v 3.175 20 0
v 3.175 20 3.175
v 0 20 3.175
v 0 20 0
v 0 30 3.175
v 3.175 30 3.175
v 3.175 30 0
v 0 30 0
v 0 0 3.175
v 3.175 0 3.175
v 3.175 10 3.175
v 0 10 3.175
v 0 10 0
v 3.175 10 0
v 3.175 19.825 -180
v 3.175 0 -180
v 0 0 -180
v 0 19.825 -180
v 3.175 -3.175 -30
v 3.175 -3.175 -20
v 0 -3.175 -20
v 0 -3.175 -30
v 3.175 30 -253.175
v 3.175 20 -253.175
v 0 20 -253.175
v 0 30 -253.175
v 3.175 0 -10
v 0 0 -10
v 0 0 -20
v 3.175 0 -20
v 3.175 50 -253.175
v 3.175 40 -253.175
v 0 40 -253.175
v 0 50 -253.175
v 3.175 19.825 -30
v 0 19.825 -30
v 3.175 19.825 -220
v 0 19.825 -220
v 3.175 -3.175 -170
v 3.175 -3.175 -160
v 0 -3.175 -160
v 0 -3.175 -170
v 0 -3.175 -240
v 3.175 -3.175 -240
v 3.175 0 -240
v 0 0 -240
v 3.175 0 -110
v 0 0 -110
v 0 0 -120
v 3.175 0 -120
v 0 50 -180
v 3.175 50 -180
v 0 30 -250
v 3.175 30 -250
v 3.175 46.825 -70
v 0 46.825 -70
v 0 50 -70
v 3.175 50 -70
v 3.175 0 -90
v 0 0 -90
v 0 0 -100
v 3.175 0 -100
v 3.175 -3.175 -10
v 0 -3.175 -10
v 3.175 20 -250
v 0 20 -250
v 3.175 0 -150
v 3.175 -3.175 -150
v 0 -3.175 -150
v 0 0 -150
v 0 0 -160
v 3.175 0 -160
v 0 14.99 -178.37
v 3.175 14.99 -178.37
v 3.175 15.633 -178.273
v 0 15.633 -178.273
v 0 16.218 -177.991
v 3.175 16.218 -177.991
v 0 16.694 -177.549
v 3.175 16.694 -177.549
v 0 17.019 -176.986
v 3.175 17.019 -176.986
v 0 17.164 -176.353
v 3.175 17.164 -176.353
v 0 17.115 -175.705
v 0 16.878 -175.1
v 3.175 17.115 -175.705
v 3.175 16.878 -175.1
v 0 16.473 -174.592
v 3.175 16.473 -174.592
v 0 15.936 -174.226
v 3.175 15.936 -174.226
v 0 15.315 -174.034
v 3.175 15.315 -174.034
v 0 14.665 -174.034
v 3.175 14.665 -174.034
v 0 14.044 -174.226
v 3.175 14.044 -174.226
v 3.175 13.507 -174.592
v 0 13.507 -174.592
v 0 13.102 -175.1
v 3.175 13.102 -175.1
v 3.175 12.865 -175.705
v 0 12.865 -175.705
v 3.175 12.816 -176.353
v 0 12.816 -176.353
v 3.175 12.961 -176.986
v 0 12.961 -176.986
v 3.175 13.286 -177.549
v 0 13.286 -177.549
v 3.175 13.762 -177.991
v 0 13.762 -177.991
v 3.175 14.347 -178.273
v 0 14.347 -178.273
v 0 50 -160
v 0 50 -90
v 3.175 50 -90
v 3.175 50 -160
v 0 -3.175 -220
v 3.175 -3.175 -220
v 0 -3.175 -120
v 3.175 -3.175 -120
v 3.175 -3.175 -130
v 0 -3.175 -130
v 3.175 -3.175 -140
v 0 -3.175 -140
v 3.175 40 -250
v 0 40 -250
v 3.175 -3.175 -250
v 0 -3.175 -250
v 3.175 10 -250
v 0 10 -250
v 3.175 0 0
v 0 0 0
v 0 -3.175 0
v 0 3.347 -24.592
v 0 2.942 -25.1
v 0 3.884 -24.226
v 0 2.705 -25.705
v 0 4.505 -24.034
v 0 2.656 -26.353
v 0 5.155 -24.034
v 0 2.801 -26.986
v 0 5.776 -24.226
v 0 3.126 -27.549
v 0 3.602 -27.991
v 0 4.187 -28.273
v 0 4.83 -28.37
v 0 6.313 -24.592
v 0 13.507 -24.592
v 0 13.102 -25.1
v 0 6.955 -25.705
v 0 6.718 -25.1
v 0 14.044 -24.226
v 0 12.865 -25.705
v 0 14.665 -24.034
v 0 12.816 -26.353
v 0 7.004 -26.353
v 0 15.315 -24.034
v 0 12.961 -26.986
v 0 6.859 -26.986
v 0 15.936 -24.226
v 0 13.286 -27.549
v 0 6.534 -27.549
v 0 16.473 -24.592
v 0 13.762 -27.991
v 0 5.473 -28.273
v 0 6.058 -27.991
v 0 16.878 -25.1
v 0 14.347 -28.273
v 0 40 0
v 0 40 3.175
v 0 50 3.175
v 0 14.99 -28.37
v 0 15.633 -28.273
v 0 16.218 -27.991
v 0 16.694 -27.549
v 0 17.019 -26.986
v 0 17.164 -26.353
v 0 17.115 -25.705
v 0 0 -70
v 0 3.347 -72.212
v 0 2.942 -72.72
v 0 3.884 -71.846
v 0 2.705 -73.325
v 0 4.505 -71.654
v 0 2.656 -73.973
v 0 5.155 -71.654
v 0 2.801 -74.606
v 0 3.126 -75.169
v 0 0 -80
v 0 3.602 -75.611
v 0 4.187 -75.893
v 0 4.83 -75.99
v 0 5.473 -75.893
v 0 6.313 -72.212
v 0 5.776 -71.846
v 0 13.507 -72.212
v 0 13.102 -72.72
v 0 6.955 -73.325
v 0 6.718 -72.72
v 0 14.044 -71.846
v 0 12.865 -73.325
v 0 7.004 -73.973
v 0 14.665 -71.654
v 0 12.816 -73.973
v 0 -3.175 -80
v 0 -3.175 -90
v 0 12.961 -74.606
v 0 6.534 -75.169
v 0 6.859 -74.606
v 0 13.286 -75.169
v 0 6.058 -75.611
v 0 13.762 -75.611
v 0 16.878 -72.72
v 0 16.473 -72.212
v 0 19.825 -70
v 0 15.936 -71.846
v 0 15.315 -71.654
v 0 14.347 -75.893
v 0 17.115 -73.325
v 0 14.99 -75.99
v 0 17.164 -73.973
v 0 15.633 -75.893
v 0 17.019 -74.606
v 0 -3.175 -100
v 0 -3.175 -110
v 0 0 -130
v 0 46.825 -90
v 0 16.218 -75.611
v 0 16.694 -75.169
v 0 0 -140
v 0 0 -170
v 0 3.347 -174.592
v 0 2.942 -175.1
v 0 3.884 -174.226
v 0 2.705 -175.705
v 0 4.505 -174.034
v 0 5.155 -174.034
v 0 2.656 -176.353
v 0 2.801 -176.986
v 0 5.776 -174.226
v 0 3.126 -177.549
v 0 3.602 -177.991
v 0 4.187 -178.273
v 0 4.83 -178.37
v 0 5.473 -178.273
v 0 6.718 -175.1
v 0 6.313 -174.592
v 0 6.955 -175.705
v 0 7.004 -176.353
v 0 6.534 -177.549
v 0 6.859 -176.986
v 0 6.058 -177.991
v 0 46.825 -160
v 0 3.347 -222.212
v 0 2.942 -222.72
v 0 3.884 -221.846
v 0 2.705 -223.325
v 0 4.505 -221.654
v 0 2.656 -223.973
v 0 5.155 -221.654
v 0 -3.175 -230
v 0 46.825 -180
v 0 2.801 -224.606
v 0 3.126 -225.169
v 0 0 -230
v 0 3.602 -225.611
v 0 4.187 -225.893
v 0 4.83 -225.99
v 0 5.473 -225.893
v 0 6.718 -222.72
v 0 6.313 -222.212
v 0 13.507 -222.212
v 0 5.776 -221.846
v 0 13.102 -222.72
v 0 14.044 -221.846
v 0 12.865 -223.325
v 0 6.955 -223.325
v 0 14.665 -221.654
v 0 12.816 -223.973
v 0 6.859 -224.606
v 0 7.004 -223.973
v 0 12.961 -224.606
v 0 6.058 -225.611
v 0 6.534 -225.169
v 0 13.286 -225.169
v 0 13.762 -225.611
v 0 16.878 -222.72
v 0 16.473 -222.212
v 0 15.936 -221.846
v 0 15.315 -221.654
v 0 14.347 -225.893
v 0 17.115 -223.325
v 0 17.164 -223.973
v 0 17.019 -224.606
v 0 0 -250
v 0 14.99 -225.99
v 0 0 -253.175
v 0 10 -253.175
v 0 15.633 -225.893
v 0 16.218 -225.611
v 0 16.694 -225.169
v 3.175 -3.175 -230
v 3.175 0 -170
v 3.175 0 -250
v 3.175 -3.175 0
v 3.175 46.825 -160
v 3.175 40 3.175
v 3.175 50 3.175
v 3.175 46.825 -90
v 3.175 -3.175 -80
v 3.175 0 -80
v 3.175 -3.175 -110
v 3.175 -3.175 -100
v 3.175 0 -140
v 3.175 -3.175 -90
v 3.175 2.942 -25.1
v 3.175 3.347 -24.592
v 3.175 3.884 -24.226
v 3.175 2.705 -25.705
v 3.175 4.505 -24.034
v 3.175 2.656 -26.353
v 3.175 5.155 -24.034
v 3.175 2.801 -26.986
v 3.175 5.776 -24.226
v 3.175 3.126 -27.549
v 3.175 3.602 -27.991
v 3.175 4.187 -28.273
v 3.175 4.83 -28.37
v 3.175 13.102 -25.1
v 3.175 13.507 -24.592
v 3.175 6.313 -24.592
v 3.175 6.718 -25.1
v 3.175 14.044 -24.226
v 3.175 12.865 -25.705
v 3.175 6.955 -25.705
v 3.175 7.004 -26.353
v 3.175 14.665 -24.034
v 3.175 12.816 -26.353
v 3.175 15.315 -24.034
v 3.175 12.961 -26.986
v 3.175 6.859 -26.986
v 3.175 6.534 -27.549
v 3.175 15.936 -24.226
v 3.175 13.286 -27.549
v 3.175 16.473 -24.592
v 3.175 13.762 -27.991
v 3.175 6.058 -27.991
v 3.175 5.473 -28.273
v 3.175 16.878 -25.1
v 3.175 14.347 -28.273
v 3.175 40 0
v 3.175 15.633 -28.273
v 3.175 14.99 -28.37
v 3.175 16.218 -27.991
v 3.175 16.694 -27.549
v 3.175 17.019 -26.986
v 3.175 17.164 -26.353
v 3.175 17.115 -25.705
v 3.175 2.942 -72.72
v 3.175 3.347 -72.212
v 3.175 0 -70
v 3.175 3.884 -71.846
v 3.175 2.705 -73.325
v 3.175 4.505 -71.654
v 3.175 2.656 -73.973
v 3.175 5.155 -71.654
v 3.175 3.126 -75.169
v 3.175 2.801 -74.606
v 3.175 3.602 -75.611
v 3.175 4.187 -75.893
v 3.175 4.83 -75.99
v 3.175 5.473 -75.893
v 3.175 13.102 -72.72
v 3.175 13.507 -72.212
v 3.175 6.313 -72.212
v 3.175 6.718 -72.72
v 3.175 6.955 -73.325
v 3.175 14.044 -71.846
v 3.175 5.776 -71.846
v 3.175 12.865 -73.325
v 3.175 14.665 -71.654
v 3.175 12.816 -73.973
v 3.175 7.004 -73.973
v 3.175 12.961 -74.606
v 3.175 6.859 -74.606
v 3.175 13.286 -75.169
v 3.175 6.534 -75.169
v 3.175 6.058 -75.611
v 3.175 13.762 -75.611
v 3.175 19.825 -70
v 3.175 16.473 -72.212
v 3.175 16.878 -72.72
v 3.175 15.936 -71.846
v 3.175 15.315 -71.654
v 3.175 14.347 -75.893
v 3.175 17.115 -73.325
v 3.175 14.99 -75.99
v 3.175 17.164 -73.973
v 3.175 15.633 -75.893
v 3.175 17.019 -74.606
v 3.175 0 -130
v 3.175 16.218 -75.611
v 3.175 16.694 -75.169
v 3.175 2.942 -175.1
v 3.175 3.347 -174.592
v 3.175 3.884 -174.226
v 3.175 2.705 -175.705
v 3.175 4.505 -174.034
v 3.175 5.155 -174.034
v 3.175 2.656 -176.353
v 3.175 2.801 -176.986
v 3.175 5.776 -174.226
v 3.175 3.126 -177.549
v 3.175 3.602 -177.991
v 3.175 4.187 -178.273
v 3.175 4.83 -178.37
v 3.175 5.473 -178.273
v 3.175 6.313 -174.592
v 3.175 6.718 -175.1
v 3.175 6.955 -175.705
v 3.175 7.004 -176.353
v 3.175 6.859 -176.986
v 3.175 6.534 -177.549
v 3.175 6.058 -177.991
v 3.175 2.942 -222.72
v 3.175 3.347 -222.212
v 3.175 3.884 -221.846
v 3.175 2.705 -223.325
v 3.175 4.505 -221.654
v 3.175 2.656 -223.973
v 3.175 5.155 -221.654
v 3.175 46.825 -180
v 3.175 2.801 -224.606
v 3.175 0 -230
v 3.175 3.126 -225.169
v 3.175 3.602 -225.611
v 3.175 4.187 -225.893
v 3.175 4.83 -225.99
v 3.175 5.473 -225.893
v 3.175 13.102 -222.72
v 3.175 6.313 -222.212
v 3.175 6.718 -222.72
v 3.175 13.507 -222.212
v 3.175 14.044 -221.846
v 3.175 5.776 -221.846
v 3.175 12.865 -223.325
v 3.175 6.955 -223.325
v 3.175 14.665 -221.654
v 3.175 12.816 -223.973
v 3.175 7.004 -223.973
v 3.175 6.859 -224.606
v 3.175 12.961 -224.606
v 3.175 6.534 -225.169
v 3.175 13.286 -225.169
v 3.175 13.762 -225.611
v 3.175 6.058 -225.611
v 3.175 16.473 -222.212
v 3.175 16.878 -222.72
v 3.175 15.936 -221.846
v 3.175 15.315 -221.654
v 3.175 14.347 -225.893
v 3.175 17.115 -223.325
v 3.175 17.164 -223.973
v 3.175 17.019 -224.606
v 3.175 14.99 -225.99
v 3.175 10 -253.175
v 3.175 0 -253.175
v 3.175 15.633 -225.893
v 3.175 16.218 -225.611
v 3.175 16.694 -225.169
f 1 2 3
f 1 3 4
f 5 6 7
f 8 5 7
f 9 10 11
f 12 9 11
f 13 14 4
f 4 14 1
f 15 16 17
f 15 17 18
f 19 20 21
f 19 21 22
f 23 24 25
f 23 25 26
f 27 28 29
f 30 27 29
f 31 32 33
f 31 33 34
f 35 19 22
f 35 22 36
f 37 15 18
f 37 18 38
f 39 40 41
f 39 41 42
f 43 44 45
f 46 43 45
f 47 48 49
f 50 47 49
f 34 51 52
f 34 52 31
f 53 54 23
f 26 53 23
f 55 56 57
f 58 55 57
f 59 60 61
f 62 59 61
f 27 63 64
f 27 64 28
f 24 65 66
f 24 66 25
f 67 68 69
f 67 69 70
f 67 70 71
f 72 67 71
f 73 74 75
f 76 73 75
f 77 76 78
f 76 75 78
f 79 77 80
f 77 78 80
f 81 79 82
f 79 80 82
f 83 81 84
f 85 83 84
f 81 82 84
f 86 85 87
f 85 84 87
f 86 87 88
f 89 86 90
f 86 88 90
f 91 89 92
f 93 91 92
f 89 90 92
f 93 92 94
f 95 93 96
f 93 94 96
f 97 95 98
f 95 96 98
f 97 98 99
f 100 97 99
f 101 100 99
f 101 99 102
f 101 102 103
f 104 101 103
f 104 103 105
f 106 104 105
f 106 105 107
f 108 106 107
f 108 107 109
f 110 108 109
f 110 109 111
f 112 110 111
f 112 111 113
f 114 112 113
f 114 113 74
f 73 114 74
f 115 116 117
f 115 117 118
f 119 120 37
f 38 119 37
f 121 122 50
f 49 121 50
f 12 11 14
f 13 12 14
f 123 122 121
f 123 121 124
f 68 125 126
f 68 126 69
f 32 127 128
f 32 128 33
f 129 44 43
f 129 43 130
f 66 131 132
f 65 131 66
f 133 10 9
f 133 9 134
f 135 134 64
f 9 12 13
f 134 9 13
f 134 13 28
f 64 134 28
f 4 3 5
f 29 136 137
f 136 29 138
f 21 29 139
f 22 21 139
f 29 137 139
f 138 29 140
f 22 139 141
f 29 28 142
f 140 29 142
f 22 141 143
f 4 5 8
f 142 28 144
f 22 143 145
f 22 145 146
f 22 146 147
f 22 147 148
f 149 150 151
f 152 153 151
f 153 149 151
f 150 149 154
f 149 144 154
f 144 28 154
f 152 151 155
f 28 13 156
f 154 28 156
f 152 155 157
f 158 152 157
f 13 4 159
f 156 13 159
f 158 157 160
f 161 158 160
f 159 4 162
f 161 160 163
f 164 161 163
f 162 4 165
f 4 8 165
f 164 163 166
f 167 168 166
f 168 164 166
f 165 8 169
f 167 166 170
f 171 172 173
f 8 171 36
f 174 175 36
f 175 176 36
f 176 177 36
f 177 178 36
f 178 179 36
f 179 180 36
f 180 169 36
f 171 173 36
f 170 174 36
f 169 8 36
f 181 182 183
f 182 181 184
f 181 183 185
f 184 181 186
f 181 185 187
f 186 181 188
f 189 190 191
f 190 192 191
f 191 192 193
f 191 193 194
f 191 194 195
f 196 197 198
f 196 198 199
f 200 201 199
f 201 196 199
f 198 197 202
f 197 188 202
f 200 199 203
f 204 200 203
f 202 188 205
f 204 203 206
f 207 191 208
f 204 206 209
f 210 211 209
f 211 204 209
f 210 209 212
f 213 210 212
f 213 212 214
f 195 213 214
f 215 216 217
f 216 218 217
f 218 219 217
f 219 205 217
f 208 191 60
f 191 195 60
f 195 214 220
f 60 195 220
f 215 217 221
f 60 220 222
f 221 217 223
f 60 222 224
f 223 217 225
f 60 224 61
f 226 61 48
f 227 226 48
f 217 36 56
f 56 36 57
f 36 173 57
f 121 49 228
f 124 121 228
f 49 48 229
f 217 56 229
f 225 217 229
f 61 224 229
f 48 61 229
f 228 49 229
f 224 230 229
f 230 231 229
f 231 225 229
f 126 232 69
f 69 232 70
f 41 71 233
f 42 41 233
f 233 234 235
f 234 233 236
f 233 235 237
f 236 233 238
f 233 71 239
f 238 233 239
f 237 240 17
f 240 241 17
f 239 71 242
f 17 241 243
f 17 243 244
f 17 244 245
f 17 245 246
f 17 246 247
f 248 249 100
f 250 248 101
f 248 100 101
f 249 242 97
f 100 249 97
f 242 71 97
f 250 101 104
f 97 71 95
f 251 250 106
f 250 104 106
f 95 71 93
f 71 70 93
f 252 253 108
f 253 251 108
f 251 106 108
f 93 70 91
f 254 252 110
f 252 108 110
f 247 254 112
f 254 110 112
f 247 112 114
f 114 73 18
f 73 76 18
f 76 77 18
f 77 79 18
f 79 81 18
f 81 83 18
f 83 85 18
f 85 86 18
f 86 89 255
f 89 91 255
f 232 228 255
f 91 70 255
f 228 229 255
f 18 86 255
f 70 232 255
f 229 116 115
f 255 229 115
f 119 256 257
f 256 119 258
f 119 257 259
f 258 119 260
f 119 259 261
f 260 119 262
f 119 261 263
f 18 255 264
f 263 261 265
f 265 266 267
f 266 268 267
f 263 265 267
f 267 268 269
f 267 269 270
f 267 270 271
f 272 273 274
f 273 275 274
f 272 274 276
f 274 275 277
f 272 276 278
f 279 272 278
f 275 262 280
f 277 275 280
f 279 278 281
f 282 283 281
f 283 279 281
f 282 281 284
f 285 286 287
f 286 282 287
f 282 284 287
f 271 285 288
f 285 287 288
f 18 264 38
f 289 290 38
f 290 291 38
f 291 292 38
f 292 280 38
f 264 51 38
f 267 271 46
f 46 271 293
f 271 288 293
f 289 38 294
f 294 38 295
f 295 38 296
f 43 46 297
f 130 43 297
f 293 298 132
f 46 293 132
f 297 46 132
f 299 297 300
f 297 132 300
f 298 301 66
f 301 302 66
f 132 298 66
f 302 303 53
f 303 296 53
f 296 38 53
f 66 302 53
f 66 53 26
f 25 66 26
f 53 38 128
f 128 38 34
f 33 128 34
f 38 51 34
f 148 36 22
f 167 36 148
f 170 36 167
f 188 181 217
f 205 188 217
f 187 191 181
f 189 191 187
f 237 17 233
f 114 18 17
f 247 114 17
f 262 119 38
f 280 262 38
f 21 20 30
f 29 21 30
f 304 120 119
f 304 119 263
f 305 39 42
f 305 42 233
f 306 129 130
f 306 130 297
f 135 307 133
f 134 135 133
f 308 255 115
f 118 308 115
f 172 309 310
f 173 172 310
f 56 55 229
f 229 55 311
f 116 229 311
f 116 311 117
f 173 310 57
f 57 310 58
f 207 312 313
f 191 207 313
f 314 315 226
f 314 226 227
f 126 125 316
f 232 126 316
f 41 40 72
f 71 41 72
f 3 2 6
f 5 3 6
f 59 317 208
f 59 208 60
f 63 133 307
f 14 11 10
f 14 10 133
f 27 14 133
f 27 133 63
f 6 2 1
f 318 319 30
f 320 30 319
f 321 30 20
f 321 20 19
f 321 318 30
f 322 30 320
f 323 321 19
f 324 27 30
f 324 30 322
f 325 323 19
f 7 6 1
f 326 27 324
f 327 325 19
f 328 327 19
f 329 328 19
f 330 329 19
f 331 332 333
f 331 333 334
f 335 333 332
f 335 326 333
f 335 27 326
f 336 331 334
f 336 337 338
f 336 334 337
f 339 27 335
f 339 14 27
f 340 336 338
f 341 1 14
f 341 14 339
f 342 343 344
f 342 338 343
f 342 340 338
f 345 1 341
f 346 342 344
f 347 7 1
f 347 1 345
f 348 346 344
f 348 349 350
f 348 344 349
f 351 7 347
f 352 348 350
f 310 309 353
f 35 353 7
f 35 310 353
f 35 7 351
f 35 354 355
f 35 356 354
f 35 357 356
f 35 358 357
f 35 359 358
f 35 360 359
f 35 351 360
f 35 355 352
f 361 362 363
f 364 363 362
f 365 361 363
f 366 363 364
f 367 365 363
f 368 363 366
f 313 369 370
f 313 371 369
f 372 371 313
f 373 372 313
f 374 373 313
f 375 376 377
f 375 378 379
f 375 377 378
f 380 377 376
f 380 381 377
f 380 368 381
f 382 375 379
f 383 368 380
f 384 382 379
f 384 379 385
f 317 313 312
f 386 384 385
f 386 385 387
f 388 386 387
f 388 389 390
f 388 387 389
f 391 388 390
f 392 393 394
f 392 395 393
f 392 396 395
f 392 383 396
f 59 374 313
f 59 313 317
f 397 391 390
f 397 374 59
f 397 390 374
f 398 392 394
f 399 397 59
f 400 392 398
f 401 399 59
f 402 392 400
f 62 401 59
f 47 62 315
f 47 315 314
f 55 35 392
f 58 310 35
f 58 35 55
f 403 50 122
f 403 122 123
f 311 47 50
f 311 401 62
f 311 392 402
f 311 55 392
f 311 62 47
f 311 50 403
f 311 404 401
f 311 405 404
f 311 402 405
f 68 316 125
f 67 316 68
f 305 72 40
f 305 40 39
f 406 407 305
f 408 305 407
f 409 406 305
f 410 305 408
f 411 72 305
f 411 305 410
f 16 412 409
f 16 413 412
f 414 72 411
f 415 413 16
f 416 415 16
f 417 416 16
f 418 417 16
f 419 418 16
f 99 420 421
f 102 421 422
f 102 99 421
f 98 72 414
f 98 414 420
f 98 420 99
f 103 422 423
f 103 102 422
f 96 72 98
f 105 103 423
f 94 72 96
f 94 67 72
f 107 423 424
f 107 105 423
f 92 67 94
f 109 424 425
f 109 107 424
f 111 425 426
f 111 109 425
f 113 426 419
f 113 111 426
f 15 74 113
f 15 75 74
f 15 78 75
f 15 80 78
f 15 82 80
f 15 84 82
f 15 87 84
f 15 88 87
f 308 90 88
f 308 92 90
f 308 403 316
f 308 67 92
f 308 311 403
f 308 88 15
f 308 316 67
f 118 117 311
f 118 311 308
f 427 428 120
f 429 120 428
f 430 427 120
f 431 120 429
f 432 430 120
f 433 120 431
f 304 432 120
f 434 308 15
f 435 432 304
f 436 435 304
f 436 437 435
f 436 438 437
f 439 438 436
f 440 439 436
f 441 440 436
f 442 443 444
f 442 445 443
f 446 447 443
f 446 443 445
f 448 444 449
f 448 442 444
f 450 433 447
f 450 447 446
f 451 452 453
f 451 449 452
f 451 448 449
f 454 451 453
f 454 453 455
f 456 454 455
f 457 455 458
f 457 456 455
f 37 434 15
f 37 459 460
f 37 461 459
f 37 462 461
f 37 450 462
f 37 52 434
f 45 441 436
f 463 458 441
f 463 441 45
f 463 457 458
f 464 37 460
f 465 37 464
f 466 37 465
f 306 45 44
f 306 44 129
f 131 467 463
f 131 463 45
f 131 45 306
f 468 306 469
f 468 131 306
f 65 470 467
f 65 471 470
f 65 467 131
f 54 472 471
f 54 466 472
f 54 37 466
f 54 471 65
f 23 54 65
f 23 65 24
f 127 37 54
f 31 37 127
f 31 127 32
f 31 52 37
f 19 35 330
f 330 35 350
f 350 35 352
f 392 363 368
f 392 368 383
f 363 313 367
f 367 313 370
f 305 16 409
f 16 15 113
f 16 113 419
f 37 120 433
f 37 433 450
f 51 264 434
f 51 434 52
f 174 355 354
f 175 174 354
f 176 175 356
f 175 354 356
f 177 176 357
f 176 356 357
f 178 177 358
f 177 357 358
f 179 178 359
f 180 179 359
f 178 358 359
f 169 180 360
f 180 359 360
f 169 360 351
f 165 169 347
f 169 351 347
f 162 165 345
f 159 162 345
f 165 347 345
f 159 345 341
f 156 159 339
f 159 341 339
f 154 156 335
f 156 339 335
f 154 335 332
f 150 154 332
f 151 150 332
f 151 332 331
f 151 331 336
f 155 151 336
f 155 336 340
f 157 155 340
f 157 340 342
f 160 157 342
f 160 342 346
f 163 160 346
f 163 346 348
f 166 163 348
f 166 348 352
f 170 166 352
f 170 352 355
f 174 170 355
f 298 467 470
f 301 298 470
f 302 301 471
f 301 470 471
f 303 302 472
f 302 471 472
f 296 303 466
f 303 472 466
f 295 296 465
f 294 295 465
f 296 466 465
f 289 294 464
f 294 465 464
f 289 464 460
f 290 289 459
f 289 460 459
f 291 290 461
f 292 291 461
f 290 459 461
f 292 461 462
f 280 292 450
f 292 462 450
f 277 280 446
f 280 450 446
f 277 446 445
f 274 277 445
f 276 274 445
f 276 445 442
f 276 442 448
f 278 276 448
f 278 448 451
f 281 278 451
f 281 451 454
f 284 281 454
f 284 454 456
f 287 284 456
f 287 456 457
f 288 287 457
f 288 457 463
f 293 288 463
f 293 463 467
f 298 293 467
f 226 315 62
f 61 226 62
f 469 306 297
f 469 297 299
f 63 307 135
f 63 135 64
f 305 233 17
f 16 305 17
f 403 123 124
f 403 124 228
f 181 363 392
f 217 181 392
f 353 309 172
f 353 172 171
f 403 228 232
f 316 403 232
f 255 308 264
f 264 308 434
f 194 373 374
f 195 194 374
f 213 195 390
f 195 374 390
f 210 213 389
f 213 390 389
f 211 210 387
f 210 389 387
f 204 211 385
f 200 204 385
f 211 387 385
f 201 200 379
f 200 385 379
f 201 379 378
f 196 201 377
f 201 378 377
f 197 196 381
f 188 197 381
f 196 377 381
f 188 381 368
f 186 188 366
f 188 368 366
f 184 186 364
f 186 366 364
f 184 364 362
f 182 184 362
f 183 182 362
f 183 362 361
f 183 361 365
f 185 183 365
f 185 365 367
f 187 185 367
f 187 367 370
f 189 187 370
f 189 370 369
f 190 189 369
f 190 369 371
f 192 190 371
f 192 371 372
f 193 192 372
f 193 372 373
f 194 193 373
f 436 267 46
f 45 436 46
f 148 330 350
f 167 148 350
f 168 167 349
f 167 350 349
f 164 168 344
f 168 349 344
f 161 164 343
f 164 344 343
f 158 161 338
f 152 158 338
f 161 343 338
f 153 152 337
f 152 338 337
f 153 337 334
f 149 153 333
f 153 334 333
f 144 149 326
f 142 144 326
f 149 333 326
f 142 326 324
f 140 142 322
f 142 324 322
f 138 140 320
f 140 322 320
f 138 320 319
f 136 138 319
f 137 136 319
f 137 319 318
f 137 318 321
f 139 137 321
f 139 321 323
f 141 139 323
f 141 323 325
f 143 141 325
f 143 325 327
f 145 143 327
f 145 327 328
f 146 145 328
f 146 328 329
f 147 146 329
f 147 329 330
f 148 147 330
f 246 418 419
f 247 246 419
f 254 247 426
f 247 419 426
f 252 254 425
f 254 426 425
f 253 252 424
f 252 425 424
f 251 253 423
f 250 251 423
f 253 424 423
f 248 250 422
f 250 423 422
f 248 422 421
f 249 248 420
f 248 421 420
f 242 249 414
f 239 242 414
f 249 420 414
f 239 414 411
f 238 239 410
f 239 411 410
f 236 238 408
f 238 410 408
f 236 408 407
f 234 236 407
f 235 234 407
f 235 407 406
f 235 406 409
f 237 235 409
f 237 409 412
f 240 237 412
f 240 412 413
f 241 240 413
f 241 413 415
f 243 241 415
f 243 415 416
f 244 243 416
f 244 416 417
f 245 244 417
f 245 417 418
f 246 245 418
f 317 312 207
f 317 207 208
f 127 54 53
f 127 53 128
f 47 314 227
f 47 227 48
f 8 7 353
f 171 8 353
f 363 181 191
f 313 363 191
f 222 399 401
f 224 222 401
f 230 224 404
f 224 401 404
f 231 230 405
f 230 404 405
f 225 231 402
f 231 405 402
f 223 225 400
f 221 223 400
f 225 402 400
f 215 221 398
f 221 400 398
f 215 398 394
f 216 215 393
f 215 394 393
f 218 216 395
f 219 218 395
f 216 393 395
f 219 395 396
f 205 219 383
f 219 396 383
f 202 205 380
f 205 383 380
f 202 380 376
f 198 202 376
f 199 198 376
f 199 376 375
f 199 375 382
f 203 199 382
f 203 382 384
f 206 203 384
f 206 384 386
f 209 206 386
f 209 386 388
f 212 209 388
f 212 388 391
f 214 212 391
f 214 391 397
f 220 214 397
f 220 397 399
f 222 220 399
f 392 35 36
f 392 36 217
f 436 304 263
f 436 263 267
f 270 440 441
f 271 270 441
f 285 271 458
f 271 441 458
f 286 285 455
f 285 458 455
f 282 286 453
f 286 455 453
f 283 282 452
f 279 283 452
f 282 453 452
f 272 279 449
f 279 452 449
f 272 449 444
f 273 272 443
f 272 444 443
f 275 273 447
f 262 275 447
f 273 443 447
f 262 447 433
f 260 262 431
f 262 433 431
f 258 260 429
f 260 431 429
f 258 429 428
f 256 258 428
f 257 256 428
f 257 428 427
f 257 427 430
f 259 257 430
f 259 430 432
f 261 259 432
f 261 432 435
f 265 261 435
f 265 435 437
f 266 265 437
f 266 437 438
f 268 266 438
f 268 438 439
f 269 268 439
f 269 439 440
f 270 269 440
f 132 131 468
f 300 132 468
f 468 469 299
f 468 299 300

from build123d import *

# Parameters (mm, degrees)
ESQUISSE1_W                = 250
ESQUISSE1_H                = 50
BOSS_EXTRU_1_DEPTH         = 3.175
ESQUISSE2_W                = 10
ESQUISSE2_H                = 3.175
BOSS_EXTRU_2_DEPTH         = 3.175
R_P_TITION_LIN_AIRE1_COUNT = 13
R_P_TITION_LIN_AIRE1_PITCH = 20
ESQUISSE4_W                = 40
ESQUISSE4_H                = 23
ESQUISSE4_W_2              = 20
ESQUISSE4_H_2              = 3.175
ENL_V_MAT_EXTRU_1_DEPTH    = 3.175
ESQUISSE5_W                = 3.175
ESQUISSE5_H                = 10
BOSS_EXTRU_3_DEPTH         = 3.175
R_P_TITION_LIN_AIRE2_COUNT = 3
R_P_TITION_LIN_AIRE2_PITCH = 20
ESQUISSE6_R                = 2.18
ENL_V_MAT_EXTRU_2_DEPTH    = 10


with BuildPart() as part:
    # Esquisse1 → Boss.-Extru.1 (new body)
    with BuildSketch(Plane(origin=(0, 0, 0), x_dir=(0, 0, -1), z_dir=(1, 0, 0))):
        with Locations((125, 25)):
            Rectangle(ESQUISSE1_W, ESQUISSE1_H)
    extrude(amount=BOSS_EXTRU_1_DEPTH)

    # Esquisse2 → Boss.-Extru.2 (add)
    with BuildSketch(Plane(origin=(3.175, 0, 0), x_dir=(0, 0, -1), z_dir=(1, 0, 0))):
        with Locations((5, -1.5875)):
            Rectangle(ESQUISSE2_W, ESQUISSE2_H)
    boss_extru_2 = extrude(amount=-BOSS_EXTRU_2_DEPTH)

    # Répétition linéaire1: Boss.-Extru.2 ×13
    with Locations(*[(0, 0, -i * R_P_TITION_LIN_AIRE1_PITCH) for i in range(1, R_P_TITION_LIN_AIRE1_COUNT)]):
        add(boss_extru_2)

    # Esquisse4 → Enlèv. mat.-Extru.1 (cut)
    with BuildSketch(Plane(origin=(3.175, 0, 0), x_dir=(0, 0, -1), z_dir=(1, 0, 0))):
        with Locations((50, 8.325)):
            Rectangle(ESQUISSE4_W, ESQUISSE4_H)
        with Locations((200, 8.325)):
            Rectangle(ESQUISSE4_W, ESQUISSE4_H)
        with Locations((80, 48.4125)):
            Rectangle(ESQUISSE4_W_2, ESQUISSE4_H_2)
        with Locations((170, 48.4125)):
            Rectangle(ESQUISSE4_W_2, ESQUISSE4_H_2)
    extrude(amount=-ENL_V_MAT_EXTRU_1_DEPTH, mode=Mode.SUBTRACT)

    # Esquisse5 → Boss.-Extru.3 (add)
    with BuildSketch(Plane(origin=(3.175, 0, 0), x_dir=(0, 0, -1), z_dir=(1, 0, 0))):
        with Locations((-1.5875, 45)):
            Rectangle(ESQUISSE5_W, ESQUISSE5_H)
        with Locations((251.5875, 45)):
            Rectangle(ESQUISSE5_W, ESQUISSE5_H)
    boss_extru_3 = extrude(amount=-BOSS_EXTRU_3_DEPTH)

    # Répétition linéaire2: Boss.-Extru.3 ×3
    with Locations(*[(0, -i * R_P_TITION_LIN_AIRE2_PITCH, 0) for i in range(1, R_P_TITION_LIN_AIRE2_COUNT)]):
        add(boss_extru_3)

    # Esquisse6 → Enlèv. mat.-Extru.2 (cut)
    with BuildSketch(Plane(origin=(3.175, 0, 0), x_dir=(0, 0, -1), z_dir=(1, 0, 0))):
        with Locations((73.81, 14.99)):
            Circle(ESQUISSE6_R)
        with Locations((73.81, 4.83)):
            Circle(ESQUISSE6_R)
        with Locations((26.19, 14.99)):
            Circle(ESQUISSE6_R)
        with Locations((26.19, 4.83)):
            Circle(ESQUISSE6_R)
        with Locations((176.19, 14.99)):
            Circle(ESQUISSE6_R)
        with Locations((176.19, 4.83)):
            Circle(ESQUISSE6_R)
        with Locations((223.81, 4.83)):
            Circle(ESQUISSE6_R)
        with Locations((223.81, 14.99)):
            Circle(ESQUISSE6_R)
    extrude(amount=-ENL_V_MAT_EXTRU_2_DEPTH, mode=Mode.SUBTRACT)


solid = part.part
